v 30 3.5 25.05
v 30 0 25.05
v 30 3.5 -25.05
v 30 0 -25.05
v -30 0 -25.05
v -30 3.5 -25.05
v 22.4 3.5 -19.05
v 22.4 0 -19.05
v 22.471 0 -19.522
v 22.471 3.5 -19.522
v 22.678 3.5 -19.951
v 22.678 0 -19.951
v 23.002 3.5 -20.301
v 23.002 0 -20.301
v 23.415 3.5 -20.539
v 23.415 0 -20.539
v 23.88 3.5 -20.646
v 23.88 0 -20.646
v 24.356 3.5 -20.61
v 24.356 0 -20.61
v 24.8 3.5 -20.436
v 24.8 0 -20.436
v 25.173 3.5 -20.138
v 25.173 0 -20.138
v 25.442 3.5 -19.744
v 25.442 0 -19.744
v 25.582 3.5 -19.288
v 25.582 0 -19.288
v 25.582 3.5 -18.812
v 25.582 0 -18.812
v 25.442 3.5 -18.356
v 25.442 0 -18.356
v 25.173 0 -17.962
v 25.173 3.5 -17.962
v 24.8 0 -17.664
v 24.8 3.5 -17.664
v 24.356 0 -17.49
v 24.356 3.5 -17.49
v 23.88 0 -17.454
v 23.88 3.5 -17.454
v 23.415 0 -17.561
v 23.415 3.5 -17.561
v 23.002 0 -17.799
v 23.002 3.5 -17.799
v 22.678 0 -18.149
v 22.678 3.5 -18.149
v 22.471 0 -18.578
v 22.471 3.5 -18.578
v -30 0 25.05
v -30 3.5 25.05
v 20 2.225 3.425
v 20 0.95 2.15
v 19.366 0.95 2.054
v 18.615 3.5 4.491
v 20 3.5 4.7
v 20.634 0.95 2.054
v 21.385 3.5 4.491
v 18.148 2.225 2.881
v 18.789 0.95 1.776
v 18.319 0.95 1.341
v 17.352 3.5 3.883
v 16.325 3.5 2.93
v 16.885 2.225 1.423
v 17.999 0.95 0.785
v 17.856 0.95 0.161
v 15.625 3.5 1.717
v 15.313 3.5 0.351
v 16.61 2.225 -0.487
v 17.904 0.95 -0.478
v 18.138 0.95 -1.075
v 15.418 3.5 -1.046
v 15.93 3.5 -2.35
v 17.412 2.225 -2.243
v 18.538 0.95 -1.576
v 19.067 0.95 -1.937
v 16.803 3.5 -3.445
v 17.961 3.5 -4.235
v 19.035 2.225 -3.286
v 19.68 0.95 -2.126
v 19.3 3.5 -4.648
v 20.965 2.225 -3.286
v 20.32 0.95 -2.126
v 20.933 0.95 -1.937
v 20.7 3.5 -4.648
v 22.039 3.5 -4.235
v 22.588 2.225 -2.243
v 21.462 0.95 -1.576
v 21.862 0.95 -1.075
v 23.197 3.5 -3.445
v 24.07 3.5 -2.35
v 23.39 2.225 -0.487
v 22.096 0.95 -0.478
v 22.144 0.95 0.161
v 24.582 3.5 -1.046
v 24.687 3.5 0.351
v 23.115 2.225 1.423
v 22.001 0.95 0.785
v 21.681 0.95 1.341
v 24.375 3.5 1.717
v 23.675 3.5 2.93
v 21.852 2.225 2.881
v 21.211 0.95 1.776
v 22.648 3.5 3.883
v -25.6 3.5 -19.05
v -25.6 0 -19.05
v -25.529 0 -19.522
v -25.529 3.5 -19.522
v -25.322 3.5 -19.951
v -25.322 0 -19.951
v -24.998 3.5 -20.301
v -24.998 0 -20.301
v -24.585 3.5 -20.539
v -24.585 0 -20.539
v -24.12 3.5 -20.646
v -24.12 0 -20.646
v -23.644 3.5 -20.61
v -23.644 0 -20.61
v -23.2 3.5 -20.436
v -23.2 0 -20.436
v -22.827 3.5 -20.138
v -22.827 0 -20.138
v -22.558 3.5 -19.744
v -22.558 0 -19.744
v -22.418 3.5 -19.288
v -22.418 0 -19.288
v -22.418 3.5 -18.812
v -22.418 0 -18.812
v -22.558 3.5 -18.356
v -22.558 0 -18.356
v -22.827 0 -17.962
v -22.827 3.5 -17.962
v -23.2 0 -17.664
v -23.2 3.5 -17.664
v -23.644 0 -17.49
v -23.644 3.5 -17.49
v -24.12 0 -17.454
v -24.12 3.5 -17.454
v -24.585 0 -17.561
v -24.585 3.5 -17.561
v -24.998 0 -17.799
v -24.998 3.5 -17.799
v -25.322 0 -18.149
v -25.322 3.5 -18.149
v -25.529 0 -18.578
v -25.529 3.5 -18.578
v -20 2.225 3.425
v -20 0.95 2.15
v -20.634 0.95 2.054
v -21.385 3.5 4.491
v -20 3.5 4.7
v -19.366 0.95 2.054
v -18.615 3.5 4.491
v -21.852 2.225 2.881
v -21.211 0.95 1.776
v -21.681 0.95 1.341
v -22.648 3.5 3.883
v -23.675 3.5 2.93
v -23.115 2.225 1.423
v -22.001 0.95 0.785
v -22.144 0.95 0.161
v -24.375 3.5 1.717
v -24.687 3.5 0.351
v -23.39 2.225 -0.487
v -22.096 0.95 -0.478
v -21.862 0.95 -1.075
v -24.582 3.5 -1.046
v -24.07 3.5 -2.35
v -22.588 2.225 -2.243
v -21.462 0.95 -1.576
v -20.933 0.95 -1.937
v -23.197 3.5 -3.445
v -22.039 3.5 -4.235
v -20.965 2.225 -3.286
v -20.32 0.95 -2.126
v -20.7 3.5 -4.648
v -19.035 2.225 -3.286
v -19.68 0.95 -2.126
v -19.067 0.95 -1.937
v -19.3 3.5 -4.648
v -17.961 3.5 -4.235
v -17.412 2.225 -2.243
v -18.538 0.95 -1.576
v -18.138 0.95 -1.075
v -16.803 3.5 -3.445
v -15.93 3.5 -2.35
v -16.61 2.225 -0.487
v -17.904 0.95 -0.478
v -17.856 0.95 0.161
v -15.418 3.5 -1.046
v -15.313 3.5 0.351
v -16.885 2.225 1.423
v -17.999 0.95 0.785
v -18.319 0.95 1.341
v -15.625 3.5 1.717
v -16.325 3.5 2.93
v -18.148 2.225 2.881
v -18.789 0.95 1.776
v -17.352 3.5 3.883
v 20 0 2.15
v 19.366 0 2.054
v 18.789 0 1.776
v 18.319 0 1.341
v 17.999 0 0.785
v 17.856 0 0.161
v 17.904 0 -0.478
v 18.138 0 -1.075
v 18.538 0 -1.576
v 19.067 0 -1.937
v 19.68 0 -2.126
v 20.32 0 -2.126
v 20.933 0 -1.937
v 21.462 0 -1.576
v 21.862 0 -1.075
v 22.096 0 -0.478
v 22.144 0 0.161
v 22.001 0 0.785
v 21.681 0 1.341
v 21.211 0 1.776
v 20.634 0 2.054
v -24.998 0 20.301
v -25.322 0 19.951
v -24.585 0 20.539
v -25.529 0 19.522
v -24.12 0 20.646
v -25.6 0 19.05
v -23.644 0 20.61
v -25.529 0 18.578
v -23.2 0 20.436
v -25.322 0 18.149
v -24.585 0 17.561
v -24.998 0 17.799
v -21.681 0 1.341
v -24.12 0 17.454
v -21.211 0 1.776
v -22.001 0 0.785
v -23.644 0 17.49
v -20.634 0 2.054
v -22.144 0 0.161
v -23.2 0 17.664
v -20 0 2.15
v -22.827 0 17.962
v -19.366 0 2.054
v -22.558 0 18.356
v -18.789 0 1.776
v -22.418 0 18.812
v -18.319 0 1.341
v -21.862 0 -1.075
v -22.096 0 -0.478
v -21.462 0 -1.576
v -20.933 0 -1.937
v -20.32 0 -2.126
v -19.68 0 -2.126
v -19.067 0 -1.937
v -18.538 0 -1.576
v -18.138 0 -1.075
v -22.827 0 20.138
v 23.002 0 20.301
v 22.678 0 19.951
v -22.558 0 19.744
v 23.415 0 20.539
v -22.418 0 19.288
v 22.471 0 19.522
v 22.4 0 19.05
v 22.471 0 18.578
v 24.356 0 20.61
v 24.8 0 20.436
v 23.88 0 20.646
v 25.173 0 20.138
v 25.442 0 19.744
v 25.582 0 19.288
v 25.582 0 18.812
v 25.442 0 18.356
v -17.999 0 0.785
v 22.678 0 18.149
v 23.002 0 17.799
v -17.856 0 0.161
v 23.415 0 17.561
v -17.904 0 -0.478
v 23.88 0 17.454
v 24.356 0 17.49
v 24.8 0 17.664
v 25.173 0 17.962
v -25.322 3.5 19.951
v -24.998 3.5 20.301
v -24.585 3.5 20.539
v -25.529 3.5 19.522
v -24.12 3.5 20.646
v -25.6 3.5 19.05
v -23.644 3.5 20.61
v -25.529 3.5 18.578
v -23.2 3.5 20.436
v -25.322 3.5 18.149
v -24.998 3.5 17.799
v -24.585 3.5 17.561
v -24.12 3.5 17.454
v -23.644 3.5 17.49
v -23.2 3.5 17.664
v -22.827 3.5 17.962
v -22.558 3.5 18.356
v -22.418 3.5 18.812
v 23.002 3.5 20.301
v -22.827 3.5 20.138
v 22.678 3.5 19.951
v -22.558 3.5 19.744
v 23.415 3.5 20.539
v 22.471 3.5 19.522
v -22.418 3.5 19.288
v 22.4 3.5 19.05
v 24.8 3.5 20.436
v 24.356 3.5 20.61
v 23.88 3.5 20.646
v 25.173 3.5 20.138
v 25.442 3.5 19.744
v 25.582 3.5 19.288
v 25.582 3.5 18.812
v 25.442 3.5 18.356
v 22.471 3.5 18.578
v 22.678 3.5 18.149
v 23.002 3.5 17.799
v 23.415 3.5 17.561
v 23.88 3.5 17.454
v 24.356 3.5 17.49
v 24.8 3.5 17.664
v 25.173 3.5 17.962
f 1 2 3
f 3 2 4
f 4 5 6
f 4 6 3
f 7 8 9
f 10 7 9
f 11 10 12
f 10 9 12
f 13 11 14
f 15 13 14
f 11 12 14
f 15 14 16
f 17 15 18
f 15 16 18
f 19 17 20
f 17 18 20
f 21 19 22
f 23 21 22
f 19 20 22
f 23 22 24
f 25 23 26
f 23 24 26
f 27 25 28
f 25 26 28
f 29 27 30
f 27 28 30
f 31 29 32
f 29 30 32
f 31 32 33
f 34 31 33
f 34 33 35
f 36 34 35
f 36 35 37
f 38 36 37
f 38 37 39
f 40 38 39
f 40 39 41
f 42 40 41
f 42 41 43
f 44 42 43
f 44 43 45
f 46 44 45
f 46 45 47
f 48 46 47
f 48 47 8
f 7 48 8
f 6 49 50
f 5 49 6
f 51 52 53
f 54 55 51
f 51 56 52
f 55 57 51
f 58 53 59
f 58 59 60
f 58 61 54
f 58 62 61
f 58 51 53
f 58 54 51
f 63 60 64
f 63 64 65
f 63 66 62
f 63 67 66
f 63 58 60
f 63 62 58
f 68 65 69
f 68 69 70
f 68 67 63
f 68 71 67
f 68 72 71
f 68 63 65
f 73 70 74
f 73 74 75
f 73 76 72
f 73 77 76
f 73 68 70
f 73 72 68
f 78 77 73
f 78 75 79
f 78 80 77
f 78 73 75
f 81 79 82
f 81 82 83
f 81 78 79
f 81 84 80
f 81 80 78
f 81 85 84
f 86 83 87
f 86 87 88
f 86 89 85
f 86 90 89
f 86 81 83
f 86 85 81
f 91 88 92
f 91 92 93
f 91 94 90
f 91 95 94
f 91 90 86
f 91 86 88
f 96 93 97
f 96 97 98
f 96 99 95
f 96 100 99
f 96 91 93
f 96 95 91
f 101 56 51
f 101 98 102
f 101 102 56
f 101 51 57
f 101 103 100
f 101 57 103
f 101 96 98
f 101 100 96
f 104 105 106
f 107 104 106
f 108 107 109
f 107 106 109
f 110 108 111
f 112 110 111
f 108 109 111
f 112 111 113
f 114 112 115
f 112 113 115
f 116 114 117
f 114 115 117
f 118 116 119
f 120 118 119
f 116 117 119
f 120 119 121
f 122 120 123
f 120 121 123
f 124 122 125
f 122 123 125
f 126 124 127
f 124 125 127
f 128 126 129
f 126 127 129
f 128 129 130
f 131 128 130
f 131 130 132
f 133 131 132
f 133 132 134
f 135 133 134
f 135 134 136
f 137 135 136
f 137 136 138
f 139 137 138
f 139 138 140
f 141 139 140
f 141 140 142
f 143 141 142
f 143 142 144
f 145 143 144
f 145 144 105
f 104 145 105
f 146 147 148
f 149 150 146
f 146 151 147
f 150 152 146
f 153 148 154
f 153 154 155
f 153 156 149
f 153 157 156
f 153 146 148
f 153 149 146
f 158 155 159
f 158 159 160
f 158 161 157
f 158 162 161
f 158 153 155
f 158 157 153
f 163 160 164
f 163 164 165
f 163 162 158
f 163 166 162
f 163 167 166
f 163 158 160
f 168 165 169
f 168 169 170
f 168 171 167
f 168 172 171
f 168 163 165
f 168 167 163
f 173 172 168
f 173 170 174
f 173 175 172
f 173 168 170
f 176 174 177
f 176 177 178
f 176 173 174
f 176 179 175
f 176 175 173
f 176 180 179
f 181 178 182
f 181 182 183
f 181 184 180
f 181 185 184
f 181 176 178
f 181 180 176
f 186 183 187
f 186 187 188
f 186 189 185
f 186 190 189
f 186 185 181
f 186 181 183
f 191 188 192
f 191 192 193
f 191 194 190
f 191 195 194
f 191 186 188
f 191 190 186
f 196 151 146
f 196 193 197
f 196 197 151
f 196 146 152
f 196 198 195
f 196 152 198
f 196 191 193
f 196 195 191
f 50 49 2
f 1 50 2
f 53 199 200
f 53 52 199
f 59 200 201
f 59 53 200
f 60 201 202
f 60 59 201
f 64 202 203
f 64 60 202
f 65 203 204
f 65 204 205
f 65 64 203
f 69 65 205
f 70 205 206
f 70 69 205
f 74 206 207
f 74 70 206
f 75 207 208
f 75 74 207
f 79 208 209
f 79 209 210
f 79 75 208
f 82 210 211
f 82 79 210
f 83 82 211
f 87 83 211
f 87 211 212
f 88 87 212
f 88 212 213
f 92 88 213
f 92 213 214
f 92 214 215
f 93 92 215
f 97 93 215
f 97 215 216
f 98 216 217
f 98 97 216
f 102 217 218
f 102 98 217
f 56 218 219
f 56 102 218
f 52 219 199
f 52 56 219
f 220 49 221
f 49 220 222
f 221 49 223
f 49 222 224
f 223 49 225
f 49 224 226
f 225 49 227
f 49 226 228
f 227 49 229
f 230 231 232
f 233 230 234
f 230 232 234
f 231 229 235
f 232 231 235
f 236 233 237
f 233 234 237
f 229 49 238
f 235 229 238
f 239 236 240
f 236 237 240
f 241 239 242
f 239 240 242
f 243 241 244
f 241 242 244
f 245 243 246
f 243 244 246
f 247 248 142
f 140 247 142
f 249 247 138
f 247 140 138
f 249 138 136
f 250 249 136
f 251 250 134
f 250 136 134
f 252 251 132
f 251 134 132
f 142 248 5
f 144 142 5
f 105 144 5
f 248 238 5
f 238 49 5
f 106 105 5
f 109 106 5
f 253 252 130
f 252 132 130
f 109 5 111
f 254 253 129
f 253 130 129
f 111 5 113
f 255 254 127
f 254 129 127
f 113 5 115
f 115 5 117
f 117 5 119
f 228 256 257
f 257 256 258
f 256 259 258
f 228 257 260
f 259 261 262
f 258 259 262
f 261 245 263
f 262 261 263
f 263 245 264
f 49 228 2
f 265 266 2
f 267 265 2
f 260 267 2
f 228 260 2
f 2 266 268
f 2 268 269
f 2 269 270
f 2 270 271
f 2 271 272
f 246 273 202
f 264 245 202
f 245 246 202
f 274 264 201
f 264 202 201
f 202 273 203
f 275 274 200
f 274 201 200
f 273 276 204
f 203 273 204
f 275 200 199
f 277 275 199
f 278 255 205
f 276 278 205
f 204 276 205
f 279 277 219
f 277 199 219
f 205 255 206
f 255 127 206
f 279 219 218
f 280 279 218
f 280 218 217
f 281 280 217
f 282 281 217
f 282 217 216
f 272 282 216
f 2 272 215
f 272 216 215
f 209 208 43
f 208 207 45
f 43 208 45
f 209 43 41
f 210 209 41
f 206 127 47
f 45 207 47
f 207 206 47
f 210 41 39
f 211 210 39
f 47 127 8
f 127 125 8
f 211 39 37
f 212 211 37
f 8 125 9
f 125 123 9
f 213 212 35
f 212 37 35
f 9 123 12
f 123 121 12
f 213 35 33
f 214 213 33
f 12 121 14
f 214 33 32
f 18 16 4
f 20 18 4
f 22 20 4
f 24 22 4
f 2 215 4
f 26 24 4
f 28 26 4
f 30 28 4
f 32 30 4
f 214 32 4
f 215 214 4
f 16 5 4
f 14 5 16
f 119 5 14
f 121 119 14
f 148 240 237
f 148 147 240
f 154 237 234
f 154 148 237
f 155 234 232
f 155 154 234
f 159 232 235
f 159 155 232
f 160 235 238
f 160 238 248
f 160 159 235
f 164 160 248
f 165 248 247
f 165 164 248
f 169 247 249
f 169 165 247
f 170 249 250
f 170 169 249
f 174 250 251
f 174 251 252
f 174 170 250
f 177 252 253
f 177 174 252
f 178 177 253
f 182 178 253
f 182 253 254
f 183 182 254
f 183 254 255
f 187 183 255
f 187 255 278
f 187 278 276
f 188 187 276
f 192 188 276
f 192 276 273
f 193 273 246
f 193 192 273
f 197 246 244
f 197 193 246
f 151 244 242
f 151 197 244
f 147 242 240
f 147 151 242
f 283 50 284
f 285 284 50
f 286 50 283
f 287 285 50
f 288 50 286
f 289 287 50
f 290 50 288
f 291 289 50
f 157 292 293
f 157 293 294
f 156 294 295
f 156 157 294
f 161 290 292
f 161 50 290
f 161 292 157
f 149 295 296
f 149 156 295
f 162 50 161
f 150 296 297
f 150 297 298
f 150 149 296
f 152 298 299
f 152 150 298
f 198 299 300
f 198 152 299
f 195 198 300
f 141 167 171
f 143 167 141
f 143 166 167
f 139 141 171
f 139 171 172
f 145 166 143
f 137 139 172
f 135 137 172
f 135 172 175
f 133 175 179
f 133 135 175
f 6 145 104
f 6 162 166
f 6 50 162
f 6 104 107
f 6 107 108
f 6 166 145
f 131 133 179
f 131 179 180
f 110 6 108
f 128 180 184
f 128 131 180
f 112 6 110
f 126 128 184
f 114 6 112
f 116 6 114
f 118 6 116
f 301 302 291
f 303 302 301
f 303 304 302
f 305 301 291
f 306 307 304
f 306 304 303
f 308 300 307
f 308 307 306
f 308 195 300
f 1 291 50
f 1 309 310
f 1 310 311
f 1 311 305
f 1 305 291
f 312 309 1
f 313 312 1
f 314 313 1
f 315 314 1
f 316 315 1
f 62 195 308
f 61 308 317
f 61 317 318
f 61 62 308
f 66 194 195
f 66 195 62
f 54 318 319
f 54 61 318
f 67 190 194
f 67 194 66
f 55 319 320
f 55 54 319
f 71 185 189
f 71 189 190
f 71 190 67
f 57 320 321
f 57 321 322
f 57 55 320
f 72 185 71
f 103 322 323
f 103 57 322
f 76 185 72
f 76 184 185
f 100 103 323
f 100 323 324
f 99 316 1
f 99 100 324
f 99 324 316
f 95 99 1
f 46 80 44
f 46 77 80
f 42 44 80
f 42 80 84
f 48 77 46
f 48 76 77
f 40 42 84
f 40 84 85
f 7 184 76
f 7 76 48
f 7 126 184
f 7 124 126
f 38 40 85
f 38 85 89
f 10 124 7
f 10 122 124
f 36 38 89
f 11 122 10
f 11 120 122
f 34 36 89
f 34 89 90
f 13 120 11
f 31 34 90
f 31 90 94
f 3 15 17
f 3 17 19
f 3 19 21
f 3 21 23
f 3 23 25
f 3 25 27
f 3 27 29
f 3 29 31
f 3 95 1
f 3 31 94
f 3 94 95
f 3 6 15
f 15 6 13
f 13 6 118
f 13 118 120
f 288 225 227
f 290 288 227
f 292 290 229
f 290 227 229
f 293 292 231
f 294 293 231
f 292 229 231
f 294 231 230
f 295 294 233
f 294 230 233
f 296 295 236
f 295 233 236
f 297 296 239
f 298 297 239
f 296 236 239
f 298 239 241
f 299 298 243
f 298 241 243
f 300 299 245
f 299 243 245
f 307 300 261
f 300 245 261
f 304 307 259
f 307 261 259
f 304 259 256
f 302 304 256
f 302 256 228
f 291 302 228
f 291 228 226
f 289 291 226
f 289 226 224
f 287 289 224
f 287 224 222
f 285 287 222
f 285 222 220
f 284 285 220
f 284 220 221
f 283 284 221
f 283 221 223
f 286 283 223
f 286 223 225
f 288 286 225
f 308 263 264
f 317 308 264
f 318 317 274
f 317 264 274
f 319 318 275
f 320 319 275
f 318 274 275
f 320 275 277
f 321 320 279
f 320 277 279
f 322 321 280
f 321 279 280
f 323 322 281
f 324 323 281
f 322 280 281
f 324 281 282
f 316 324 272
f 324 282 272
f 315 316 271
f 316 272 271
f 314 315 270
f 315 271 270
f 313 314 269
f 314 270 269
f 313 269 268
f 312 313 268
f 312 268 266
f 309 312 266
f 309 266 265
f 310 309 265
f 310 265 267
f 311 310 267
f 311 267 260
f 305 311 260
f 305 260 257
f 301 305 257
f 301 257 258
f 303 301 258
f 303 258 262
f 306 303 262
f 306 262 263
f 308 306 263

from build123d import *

# Parameters (mm, degrees)
SKETCH1_W                                      = 60
SKETCH1_H                                      = 50.1
SKETCH1_R                                      = 1.5
SKETCH1_R_2                                    = 0.5
BOSS_EXTRUDE2_DEPTH                            = 3.5
M3_CLEARANCE_HOLE1_D                           = 3.2
M3_CLEARANCE_HOLE1_DEPTH                       = 3.5
CSK_FOR_M4_FLAT_HEAD_MACHINE_SCREW1_AT_2_COUNT = 2
CSK_FOR_M4_FLAT_HEAD_MACHINE_SCREW1_AT_2_PITCH = 40


with BuildPart() as part:
    # Sketch1 → Boss-Extrude2 (new body)
    with BuildSketch(Plane(origin=(0, 0, 0), x_dir=(1, 0, 0), z_dir=(0, 1, 0))):
        Rectangle(SKETCH1_W, SKETCH1_H)
        with Locations((-24, 19.05)):
            Circle(SKETCH1_R, mode=Mode.SUBTRACT)
        with Locations((-24, -19.05)):
            Circle(SKETCH1_R, mode=Mode.SUBTRACT)
        with Locations((24, -19.05)):
            Circle(SKETCH1_R, mode=Mode.SUBTRACT)
        with Locations((24, 19.05)):
            Circle(SKETCH1_R, mode=Mode.SUBTRACT)
        with Locations((20, 0)):
            Circle(SKETCH1_R_2, mode=Mode.SUBTRACT)
        with Locations((-20, 0)):
            Circle(SKETCH1_R_2, mode=Mode.SUBTRACT)
    extrude(amount=BOSS_EXTRUDE2_DEPTH)

    # M3 Clearance Hole1
    with Locations(Plane(origin=(0, 3.5, 0), x_dir=(1, 0, 0), z_dir=(0, 1, 0))):
        with Locations((-24, 19.05), (24, 19.05), (24, -19.05), (-24, -19.05)):
            Hole(M3_CLEARANCE_HOLE1_D / 2, depth=M3_CLEARANCE_HOLE1_DEPTH)

    # Sketch5 → CSK for M4 Flat Head Machine Screw1 (revolve, cut)
    with BuildSketch(Plane(origin=(-20, 3.5, 0), x_dir=(0, 0, 1), z_dir=(1, 0, 0))):
        Polygon((0, 0), (0, 3.5), (2.15, 3.5), (2.15, 2.55), (4.7, 0), align=None)
    csk_for_m4_flat_head_machine_screw1 = revolve(axis=Axis((-20, 9.85, 0), (0, -1, 0)), mode=Mode.SUBTRACT)

    # CSK for M4 Flat Head Machine Screw1 at 2: CSK for M4 Flat Head Machine Screw1 ×2
    with Locations(*[(i * CSK_FOR_M4_FLAT_HEAD_MACHINE_SCREW1_AT_2_PITCH, 0, 0) for i in range(1, CSK_FOR_M4_FLAT_HEAD_MACHINE_SCREW1_AT_2_COUNT)]):
        add(csk_for_m4_flat_head_machine_screw1, mode=Mode.SUBTRACT)


solid = part.part
